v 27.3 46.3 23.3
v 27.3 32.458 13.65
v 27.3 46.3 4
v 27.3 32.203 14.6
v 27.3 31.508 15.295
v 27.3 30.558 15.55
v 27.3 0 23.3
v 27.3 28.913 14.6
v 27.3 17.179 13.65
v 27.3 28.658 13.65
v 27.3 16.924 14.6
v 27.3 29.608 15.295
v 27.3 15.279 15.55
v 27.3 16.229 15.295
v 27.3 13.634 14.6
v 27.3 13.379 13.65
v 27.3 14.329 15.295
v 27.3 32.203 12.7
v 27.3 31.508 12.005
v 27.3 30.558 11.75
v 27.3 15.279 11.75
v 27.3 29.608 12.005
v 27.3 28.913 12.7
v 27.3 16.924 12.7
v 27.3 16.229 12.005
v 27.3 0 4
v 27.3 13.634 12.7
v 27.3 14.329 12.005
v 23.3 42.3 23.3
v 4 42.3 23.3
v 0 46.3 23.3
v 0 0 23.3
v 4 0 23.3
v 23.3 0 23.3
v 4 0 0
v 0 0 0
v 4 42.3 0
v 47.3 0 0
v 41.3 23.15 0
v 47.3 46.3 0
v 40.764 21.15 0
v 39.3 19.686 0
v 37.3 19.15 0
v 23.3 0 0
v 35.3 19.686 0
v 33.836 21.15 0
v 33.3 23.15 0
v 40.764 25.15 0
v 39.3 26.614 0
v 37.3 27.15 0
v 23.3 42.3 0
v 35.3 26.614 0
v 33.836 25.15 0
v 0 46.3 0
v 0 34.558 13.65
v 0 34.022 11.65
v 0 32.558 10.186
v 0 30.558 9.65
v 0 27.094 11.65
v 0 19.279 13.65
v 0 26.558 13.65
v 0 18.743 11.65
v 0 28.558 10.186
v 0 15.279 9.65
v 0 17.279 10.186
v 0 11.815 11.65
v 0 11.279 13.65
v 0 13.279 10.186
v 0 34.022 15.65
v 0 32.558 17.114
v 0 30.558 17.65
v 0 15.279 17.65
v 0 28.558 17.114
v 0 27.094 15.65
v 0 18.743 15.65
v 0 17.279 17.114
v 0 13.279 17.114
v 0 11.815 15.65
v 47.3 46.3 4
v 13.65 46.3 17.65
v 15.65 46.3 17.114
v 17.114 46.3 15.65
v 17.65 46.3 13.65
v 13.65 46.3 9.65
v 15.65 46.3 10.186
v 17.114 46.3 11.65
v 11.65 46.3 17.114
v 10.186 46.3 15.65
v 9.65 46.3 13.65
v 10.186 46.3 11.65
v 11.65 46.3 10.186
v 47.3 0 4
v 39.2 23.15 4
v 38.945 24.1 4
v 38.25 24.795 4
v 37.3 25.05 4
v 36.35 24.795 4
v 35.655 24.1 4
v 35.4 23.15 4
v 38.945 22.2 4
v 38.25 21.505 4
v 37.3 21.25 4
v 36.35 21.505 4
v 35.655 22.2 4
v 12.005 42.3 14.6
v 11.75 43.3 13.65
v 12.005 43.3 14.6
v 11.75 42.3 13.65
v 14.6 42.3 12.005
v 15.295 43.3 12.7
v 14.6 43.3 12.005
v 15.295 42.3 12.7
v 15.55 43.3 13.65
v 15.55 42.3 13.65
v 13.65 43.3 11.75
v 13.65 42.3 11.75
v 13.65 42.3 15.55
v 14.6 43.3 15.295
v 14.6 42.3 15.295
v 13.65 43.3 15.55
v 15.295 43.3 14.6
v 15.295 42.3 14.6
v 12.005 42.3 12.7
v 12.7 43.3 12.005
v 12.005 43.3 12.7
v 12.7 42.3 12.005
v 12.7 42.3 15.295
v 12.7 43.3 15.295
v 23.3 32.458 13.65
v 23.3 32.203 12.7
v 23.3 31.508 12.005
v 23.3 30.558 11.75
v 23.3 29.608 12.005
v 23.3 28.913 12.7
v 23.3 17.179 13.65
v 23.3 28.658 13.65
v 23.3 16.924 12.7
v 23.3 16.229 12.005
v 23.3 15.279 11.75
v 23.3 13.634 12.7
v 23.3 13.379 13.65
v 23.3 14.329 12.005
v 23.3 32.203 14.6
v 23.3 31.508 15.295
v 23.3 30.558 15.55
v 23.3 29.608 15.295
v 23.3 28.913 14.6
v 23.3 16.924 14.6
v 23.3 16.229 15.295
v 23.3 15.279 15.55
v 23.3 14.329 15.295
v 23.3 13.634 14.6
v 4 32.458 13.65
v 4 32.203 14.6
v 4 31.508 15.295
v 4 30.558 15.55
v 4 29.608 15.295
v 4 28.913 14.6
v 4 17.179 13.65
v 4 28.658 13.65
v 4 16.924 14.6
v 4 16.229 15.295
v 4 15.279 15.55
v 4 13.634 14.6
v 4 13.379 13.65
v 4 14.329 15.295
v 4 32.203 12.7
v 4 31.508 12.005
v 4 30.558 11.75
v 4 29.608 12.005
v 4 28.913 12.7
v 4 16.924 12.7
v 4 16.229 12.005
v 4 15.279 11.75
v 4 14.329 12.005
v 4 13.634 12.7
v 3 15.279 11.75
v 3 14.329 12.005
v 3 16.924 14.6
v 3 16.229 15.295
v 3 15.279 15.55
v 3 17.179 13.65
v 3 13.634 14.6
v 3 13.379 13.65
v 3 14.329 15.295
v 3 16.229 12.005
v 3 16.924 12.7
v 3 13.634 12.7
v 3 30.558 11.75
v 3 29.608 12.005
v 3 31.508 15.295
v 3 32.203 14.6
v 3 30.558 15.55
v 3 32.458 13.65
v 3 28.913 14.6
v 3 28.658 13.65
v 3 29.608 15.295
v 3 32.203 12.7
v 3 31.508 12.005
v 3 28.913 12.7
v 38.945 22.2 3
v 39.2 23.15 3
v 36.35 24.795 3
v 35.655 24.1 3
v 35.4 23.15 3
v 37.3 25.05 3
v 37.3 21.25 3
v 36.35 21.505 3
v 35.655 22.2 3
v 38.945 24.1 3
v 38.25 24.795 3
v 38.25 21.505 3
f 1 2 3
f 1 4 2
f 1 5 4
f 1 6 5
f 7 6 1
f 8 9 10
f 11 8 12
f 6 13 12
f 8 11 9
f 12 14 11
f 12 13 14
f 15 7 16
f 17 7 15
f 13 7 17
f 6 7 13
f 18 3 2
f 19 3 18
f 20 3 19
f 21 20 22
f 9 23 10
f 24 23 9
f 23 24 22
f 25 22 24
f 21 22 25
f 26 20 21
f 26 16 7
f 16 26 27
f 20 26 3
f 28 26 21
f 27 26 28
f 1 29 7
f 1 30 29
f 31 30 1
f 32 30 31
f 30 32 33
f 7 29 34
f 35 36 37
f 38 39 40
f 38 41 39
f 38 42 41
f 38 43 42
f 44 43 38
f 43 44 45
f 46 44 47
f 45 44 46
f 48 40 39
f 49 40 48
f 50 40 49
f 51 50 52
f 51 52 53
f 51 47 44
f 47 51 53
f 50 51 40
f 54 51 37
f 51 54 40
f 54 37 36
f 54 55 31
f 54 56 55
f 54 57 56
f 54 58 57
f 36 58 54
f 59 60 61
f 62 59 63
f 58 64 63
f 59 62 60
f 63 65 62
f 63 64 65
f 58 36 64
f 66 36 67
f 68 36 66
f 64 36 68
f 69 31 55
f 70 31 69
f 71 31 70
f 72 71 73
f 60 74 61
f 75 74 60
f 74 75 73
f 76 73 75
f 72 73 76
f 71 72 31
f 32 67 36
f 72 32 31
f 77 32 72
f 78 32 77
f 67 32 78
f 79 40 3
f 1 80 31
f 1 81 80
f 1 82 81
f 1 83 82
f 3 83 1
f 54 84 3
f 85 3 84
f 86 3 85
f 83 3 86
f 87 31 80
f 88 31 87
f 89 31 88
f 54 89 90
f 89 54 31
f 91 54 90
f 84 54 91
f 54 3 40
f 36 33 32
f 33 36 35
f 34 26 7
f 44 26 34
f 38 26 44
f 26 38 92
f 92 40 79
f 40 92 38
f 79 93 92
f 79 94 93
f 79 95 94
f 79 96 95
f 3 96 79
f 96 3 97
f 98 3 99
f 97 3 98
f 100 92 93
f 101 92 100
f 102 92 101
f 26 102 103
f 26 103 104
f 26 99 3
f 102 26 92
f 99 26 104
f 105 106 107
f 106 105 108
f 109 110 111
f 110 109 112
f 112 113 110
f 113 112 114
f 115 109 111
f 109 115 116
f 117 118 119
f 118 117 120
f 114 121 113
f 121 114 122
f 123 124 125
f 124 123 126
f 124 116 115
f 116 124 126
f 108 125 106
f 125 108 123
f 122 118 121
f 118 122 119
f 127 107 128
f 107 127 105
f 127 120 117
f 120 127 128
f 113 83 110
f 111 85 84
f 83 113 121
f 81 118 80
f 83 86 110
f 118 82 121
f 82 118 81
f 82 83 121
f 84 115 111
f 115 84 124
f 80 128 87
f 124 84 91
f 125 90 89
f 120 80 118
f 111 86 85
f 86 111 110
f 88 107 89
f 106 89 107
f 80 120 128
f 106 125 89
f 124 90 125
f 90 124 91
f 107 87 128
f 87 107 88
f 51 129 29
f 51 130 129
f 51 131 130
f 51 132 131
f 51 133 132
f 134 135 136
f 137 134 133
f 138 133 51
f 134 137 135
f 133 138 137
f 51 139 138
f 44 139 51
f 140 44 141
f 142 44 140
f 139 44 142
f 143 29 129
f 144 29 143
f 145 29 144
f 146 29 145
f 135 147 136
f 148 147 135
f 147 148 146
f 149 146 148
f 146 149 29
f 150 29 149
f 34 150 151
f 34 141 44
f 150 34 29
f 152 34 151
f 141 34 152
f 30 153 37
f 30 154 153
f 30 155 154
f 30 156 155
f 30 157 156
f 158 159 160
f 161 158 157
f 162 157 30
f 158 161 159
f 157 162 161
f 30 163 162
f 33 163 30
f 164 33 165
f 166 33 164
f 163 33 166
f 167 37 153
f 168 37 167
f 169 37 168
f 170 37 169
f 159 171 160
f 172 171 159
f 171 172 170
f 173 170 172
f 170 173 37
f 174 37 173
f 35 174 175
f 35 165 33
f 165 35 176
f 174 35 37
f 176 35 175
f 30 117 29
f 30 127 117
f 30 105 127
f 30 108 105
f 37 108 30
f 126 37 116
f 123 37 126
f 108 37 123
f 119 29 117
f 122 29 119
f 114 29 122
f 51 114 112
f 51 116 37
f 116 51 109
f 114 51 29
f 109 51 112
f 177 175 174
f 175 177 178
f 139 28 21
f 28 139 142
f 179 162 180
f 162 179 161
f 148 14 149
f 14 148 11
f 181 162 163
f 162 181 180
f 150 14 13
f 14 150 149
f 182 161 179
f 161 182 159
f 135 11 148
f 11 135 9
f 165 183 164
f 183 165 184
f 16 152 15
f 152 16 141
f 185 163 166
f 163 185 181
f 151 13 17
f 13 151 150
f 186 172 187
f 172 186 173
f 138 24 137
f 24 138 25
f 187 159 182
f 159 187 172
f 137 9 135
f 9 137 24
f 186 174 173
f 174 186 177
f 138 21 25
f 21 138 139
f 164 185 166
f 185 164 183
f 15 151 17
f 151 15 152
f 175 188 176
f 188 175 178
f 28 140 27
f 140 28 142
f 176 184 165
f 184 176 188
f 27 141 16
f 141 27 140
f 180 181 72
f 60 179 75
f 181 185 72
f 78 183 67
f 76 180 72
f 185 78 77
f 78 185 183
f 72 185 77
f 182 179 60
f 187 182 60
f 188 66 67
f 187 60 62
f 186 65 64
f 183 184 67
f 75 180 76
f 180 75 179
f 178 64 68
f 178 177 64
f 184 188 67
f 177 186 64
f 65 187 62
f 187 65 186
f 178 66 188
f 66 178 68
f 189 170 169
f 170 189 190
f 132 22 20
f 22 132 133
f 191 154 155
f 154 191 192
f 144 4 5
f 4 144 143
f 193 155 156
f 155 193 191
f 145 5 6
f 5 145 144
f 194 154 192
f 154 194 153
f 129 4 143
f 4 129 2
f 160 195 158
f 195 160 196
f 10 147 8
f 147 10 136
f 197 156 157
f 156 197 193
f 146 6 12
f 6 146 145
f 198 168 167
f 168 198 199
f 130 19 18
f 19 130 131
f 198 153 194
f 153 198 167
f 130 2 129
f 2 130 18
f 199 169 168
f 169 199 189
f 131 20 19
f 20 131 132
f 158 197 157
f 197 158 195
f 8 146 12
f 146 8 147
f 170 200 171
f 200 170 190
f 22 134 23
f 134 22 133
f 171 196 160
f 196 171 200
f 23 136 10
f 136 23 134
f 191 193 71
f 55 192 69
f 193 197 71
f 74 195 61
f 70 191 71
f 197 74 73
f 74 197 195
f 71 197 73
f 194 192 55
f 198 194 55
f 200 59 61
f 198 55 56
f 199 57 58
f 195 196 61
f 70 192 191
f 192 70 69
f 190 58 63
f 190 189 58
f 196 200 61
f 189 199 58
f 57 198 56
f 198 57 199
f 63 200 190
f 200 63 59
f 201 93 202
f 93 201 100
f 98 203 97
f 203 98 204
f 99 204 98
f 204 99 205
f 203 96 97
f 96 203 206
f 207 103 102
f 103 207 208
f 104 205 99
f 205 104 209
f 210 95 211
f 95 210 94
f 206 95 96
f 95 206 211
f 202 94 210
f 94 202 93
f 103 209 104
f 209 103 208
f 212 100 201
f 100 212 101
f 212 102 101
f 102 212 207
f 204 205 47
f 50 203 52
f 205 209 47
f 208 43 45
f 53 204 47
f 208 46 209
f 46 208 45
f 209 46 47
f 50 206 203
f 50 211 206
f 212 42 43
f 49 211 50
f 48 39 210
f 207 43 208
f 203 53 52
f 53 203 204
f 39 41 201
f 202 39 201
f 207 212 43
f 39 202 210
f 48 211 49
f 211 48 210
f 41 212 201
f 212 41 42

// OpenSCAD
difference(){
	union() {
		translate(v = [0, 0, 0]) {
			cube(size = [27.3000000000, 46.3000000000, 23.3000000000]);
		}
		translate(v = [27.3000000000, 0, 0]) {
			cube(size = [20, 46.3000000000, 4]);
		}
	}
	/* Holes Below*/
	union(){
		translate(v = [0, 0, 0]){
			translate(v = [4, -1, 0]) {
				cube(size = [19.3000000000, 43.3000000000, 28.3000000000]);
			}
			translate(v = [13.6500000000, 46.3000000000, 13.6500000000]) {
				rotate(a = -90, v = [1, 0, 0]) {
					union() {
						union() {
							translate(v = [0, 0, -5]) {
								cylinder($fn = 12, h = 5, r = 1.9000000000);
							}
							translate(v = [0, 0, -3]) {
								cylinder($fn = 12, h = 3, r1 = 1.9000000000, r2 = 4);
							}
						}
						cylinder($fn = 12, h = 1, r = 4);
					}
				}
			}
		}
		translate(v = [0, 15.2790000000, 13.6500000000]) {
			rotate(a = -90, v = [0, 1, 0]) {
				union() {
					union() {
						translate(v = [0, 0, -28.3000000000]) {
							cylinder($fn = 12, h = 28.3000000000, r = 1.9000000000);
						}
						translate(v = [0, 0, -3]) {
							cylinder($fn = 12, h = 3, r1 = 1.9000000000, r2 = 4);
						}
					}
					cylinder($fn = 12, h = 1, r = 4);
				}
			}
		}
		translate(v = [0, 30.5580000000, 13.6500000000]) {
			rotate(a = -90, v = [0, 1, 0]) {
				union() {
					union() {
						translate(v = [0, 0, -28.3000000000]) {
							cylinder($fn = 12, h = 28.3000000000, r = 1.9000000000);
						}
						translate(v = [0, 0, -3]) {
							cylinder($fn = 12, h = 3, r1 = 1.9000000000, r2 = 4);
						}
					}
					cylinder($fn = 12, h = 1, r = 4);
				}
			}
		}
		translate(v = [37.3000000000, 23.1500000000, 0]) {
			rotate(a = 180, v = [0, 1, 0]) {
				union() {
					union() {
						translate(v = [0, 0, -5]) {
							cylinder($fn = 12, h = 5, r = 1.9000000000);
						}
						translate(v = [0, 0, -3]) {
							cylinder($fn = 12, h = 3, r1 = 1.9000000000, r2 = 4);
						}
					}
					cylinder($fn = 12, h = 1, r = 4);
				}
			}
		}
	} /* End Holes */ 
}
